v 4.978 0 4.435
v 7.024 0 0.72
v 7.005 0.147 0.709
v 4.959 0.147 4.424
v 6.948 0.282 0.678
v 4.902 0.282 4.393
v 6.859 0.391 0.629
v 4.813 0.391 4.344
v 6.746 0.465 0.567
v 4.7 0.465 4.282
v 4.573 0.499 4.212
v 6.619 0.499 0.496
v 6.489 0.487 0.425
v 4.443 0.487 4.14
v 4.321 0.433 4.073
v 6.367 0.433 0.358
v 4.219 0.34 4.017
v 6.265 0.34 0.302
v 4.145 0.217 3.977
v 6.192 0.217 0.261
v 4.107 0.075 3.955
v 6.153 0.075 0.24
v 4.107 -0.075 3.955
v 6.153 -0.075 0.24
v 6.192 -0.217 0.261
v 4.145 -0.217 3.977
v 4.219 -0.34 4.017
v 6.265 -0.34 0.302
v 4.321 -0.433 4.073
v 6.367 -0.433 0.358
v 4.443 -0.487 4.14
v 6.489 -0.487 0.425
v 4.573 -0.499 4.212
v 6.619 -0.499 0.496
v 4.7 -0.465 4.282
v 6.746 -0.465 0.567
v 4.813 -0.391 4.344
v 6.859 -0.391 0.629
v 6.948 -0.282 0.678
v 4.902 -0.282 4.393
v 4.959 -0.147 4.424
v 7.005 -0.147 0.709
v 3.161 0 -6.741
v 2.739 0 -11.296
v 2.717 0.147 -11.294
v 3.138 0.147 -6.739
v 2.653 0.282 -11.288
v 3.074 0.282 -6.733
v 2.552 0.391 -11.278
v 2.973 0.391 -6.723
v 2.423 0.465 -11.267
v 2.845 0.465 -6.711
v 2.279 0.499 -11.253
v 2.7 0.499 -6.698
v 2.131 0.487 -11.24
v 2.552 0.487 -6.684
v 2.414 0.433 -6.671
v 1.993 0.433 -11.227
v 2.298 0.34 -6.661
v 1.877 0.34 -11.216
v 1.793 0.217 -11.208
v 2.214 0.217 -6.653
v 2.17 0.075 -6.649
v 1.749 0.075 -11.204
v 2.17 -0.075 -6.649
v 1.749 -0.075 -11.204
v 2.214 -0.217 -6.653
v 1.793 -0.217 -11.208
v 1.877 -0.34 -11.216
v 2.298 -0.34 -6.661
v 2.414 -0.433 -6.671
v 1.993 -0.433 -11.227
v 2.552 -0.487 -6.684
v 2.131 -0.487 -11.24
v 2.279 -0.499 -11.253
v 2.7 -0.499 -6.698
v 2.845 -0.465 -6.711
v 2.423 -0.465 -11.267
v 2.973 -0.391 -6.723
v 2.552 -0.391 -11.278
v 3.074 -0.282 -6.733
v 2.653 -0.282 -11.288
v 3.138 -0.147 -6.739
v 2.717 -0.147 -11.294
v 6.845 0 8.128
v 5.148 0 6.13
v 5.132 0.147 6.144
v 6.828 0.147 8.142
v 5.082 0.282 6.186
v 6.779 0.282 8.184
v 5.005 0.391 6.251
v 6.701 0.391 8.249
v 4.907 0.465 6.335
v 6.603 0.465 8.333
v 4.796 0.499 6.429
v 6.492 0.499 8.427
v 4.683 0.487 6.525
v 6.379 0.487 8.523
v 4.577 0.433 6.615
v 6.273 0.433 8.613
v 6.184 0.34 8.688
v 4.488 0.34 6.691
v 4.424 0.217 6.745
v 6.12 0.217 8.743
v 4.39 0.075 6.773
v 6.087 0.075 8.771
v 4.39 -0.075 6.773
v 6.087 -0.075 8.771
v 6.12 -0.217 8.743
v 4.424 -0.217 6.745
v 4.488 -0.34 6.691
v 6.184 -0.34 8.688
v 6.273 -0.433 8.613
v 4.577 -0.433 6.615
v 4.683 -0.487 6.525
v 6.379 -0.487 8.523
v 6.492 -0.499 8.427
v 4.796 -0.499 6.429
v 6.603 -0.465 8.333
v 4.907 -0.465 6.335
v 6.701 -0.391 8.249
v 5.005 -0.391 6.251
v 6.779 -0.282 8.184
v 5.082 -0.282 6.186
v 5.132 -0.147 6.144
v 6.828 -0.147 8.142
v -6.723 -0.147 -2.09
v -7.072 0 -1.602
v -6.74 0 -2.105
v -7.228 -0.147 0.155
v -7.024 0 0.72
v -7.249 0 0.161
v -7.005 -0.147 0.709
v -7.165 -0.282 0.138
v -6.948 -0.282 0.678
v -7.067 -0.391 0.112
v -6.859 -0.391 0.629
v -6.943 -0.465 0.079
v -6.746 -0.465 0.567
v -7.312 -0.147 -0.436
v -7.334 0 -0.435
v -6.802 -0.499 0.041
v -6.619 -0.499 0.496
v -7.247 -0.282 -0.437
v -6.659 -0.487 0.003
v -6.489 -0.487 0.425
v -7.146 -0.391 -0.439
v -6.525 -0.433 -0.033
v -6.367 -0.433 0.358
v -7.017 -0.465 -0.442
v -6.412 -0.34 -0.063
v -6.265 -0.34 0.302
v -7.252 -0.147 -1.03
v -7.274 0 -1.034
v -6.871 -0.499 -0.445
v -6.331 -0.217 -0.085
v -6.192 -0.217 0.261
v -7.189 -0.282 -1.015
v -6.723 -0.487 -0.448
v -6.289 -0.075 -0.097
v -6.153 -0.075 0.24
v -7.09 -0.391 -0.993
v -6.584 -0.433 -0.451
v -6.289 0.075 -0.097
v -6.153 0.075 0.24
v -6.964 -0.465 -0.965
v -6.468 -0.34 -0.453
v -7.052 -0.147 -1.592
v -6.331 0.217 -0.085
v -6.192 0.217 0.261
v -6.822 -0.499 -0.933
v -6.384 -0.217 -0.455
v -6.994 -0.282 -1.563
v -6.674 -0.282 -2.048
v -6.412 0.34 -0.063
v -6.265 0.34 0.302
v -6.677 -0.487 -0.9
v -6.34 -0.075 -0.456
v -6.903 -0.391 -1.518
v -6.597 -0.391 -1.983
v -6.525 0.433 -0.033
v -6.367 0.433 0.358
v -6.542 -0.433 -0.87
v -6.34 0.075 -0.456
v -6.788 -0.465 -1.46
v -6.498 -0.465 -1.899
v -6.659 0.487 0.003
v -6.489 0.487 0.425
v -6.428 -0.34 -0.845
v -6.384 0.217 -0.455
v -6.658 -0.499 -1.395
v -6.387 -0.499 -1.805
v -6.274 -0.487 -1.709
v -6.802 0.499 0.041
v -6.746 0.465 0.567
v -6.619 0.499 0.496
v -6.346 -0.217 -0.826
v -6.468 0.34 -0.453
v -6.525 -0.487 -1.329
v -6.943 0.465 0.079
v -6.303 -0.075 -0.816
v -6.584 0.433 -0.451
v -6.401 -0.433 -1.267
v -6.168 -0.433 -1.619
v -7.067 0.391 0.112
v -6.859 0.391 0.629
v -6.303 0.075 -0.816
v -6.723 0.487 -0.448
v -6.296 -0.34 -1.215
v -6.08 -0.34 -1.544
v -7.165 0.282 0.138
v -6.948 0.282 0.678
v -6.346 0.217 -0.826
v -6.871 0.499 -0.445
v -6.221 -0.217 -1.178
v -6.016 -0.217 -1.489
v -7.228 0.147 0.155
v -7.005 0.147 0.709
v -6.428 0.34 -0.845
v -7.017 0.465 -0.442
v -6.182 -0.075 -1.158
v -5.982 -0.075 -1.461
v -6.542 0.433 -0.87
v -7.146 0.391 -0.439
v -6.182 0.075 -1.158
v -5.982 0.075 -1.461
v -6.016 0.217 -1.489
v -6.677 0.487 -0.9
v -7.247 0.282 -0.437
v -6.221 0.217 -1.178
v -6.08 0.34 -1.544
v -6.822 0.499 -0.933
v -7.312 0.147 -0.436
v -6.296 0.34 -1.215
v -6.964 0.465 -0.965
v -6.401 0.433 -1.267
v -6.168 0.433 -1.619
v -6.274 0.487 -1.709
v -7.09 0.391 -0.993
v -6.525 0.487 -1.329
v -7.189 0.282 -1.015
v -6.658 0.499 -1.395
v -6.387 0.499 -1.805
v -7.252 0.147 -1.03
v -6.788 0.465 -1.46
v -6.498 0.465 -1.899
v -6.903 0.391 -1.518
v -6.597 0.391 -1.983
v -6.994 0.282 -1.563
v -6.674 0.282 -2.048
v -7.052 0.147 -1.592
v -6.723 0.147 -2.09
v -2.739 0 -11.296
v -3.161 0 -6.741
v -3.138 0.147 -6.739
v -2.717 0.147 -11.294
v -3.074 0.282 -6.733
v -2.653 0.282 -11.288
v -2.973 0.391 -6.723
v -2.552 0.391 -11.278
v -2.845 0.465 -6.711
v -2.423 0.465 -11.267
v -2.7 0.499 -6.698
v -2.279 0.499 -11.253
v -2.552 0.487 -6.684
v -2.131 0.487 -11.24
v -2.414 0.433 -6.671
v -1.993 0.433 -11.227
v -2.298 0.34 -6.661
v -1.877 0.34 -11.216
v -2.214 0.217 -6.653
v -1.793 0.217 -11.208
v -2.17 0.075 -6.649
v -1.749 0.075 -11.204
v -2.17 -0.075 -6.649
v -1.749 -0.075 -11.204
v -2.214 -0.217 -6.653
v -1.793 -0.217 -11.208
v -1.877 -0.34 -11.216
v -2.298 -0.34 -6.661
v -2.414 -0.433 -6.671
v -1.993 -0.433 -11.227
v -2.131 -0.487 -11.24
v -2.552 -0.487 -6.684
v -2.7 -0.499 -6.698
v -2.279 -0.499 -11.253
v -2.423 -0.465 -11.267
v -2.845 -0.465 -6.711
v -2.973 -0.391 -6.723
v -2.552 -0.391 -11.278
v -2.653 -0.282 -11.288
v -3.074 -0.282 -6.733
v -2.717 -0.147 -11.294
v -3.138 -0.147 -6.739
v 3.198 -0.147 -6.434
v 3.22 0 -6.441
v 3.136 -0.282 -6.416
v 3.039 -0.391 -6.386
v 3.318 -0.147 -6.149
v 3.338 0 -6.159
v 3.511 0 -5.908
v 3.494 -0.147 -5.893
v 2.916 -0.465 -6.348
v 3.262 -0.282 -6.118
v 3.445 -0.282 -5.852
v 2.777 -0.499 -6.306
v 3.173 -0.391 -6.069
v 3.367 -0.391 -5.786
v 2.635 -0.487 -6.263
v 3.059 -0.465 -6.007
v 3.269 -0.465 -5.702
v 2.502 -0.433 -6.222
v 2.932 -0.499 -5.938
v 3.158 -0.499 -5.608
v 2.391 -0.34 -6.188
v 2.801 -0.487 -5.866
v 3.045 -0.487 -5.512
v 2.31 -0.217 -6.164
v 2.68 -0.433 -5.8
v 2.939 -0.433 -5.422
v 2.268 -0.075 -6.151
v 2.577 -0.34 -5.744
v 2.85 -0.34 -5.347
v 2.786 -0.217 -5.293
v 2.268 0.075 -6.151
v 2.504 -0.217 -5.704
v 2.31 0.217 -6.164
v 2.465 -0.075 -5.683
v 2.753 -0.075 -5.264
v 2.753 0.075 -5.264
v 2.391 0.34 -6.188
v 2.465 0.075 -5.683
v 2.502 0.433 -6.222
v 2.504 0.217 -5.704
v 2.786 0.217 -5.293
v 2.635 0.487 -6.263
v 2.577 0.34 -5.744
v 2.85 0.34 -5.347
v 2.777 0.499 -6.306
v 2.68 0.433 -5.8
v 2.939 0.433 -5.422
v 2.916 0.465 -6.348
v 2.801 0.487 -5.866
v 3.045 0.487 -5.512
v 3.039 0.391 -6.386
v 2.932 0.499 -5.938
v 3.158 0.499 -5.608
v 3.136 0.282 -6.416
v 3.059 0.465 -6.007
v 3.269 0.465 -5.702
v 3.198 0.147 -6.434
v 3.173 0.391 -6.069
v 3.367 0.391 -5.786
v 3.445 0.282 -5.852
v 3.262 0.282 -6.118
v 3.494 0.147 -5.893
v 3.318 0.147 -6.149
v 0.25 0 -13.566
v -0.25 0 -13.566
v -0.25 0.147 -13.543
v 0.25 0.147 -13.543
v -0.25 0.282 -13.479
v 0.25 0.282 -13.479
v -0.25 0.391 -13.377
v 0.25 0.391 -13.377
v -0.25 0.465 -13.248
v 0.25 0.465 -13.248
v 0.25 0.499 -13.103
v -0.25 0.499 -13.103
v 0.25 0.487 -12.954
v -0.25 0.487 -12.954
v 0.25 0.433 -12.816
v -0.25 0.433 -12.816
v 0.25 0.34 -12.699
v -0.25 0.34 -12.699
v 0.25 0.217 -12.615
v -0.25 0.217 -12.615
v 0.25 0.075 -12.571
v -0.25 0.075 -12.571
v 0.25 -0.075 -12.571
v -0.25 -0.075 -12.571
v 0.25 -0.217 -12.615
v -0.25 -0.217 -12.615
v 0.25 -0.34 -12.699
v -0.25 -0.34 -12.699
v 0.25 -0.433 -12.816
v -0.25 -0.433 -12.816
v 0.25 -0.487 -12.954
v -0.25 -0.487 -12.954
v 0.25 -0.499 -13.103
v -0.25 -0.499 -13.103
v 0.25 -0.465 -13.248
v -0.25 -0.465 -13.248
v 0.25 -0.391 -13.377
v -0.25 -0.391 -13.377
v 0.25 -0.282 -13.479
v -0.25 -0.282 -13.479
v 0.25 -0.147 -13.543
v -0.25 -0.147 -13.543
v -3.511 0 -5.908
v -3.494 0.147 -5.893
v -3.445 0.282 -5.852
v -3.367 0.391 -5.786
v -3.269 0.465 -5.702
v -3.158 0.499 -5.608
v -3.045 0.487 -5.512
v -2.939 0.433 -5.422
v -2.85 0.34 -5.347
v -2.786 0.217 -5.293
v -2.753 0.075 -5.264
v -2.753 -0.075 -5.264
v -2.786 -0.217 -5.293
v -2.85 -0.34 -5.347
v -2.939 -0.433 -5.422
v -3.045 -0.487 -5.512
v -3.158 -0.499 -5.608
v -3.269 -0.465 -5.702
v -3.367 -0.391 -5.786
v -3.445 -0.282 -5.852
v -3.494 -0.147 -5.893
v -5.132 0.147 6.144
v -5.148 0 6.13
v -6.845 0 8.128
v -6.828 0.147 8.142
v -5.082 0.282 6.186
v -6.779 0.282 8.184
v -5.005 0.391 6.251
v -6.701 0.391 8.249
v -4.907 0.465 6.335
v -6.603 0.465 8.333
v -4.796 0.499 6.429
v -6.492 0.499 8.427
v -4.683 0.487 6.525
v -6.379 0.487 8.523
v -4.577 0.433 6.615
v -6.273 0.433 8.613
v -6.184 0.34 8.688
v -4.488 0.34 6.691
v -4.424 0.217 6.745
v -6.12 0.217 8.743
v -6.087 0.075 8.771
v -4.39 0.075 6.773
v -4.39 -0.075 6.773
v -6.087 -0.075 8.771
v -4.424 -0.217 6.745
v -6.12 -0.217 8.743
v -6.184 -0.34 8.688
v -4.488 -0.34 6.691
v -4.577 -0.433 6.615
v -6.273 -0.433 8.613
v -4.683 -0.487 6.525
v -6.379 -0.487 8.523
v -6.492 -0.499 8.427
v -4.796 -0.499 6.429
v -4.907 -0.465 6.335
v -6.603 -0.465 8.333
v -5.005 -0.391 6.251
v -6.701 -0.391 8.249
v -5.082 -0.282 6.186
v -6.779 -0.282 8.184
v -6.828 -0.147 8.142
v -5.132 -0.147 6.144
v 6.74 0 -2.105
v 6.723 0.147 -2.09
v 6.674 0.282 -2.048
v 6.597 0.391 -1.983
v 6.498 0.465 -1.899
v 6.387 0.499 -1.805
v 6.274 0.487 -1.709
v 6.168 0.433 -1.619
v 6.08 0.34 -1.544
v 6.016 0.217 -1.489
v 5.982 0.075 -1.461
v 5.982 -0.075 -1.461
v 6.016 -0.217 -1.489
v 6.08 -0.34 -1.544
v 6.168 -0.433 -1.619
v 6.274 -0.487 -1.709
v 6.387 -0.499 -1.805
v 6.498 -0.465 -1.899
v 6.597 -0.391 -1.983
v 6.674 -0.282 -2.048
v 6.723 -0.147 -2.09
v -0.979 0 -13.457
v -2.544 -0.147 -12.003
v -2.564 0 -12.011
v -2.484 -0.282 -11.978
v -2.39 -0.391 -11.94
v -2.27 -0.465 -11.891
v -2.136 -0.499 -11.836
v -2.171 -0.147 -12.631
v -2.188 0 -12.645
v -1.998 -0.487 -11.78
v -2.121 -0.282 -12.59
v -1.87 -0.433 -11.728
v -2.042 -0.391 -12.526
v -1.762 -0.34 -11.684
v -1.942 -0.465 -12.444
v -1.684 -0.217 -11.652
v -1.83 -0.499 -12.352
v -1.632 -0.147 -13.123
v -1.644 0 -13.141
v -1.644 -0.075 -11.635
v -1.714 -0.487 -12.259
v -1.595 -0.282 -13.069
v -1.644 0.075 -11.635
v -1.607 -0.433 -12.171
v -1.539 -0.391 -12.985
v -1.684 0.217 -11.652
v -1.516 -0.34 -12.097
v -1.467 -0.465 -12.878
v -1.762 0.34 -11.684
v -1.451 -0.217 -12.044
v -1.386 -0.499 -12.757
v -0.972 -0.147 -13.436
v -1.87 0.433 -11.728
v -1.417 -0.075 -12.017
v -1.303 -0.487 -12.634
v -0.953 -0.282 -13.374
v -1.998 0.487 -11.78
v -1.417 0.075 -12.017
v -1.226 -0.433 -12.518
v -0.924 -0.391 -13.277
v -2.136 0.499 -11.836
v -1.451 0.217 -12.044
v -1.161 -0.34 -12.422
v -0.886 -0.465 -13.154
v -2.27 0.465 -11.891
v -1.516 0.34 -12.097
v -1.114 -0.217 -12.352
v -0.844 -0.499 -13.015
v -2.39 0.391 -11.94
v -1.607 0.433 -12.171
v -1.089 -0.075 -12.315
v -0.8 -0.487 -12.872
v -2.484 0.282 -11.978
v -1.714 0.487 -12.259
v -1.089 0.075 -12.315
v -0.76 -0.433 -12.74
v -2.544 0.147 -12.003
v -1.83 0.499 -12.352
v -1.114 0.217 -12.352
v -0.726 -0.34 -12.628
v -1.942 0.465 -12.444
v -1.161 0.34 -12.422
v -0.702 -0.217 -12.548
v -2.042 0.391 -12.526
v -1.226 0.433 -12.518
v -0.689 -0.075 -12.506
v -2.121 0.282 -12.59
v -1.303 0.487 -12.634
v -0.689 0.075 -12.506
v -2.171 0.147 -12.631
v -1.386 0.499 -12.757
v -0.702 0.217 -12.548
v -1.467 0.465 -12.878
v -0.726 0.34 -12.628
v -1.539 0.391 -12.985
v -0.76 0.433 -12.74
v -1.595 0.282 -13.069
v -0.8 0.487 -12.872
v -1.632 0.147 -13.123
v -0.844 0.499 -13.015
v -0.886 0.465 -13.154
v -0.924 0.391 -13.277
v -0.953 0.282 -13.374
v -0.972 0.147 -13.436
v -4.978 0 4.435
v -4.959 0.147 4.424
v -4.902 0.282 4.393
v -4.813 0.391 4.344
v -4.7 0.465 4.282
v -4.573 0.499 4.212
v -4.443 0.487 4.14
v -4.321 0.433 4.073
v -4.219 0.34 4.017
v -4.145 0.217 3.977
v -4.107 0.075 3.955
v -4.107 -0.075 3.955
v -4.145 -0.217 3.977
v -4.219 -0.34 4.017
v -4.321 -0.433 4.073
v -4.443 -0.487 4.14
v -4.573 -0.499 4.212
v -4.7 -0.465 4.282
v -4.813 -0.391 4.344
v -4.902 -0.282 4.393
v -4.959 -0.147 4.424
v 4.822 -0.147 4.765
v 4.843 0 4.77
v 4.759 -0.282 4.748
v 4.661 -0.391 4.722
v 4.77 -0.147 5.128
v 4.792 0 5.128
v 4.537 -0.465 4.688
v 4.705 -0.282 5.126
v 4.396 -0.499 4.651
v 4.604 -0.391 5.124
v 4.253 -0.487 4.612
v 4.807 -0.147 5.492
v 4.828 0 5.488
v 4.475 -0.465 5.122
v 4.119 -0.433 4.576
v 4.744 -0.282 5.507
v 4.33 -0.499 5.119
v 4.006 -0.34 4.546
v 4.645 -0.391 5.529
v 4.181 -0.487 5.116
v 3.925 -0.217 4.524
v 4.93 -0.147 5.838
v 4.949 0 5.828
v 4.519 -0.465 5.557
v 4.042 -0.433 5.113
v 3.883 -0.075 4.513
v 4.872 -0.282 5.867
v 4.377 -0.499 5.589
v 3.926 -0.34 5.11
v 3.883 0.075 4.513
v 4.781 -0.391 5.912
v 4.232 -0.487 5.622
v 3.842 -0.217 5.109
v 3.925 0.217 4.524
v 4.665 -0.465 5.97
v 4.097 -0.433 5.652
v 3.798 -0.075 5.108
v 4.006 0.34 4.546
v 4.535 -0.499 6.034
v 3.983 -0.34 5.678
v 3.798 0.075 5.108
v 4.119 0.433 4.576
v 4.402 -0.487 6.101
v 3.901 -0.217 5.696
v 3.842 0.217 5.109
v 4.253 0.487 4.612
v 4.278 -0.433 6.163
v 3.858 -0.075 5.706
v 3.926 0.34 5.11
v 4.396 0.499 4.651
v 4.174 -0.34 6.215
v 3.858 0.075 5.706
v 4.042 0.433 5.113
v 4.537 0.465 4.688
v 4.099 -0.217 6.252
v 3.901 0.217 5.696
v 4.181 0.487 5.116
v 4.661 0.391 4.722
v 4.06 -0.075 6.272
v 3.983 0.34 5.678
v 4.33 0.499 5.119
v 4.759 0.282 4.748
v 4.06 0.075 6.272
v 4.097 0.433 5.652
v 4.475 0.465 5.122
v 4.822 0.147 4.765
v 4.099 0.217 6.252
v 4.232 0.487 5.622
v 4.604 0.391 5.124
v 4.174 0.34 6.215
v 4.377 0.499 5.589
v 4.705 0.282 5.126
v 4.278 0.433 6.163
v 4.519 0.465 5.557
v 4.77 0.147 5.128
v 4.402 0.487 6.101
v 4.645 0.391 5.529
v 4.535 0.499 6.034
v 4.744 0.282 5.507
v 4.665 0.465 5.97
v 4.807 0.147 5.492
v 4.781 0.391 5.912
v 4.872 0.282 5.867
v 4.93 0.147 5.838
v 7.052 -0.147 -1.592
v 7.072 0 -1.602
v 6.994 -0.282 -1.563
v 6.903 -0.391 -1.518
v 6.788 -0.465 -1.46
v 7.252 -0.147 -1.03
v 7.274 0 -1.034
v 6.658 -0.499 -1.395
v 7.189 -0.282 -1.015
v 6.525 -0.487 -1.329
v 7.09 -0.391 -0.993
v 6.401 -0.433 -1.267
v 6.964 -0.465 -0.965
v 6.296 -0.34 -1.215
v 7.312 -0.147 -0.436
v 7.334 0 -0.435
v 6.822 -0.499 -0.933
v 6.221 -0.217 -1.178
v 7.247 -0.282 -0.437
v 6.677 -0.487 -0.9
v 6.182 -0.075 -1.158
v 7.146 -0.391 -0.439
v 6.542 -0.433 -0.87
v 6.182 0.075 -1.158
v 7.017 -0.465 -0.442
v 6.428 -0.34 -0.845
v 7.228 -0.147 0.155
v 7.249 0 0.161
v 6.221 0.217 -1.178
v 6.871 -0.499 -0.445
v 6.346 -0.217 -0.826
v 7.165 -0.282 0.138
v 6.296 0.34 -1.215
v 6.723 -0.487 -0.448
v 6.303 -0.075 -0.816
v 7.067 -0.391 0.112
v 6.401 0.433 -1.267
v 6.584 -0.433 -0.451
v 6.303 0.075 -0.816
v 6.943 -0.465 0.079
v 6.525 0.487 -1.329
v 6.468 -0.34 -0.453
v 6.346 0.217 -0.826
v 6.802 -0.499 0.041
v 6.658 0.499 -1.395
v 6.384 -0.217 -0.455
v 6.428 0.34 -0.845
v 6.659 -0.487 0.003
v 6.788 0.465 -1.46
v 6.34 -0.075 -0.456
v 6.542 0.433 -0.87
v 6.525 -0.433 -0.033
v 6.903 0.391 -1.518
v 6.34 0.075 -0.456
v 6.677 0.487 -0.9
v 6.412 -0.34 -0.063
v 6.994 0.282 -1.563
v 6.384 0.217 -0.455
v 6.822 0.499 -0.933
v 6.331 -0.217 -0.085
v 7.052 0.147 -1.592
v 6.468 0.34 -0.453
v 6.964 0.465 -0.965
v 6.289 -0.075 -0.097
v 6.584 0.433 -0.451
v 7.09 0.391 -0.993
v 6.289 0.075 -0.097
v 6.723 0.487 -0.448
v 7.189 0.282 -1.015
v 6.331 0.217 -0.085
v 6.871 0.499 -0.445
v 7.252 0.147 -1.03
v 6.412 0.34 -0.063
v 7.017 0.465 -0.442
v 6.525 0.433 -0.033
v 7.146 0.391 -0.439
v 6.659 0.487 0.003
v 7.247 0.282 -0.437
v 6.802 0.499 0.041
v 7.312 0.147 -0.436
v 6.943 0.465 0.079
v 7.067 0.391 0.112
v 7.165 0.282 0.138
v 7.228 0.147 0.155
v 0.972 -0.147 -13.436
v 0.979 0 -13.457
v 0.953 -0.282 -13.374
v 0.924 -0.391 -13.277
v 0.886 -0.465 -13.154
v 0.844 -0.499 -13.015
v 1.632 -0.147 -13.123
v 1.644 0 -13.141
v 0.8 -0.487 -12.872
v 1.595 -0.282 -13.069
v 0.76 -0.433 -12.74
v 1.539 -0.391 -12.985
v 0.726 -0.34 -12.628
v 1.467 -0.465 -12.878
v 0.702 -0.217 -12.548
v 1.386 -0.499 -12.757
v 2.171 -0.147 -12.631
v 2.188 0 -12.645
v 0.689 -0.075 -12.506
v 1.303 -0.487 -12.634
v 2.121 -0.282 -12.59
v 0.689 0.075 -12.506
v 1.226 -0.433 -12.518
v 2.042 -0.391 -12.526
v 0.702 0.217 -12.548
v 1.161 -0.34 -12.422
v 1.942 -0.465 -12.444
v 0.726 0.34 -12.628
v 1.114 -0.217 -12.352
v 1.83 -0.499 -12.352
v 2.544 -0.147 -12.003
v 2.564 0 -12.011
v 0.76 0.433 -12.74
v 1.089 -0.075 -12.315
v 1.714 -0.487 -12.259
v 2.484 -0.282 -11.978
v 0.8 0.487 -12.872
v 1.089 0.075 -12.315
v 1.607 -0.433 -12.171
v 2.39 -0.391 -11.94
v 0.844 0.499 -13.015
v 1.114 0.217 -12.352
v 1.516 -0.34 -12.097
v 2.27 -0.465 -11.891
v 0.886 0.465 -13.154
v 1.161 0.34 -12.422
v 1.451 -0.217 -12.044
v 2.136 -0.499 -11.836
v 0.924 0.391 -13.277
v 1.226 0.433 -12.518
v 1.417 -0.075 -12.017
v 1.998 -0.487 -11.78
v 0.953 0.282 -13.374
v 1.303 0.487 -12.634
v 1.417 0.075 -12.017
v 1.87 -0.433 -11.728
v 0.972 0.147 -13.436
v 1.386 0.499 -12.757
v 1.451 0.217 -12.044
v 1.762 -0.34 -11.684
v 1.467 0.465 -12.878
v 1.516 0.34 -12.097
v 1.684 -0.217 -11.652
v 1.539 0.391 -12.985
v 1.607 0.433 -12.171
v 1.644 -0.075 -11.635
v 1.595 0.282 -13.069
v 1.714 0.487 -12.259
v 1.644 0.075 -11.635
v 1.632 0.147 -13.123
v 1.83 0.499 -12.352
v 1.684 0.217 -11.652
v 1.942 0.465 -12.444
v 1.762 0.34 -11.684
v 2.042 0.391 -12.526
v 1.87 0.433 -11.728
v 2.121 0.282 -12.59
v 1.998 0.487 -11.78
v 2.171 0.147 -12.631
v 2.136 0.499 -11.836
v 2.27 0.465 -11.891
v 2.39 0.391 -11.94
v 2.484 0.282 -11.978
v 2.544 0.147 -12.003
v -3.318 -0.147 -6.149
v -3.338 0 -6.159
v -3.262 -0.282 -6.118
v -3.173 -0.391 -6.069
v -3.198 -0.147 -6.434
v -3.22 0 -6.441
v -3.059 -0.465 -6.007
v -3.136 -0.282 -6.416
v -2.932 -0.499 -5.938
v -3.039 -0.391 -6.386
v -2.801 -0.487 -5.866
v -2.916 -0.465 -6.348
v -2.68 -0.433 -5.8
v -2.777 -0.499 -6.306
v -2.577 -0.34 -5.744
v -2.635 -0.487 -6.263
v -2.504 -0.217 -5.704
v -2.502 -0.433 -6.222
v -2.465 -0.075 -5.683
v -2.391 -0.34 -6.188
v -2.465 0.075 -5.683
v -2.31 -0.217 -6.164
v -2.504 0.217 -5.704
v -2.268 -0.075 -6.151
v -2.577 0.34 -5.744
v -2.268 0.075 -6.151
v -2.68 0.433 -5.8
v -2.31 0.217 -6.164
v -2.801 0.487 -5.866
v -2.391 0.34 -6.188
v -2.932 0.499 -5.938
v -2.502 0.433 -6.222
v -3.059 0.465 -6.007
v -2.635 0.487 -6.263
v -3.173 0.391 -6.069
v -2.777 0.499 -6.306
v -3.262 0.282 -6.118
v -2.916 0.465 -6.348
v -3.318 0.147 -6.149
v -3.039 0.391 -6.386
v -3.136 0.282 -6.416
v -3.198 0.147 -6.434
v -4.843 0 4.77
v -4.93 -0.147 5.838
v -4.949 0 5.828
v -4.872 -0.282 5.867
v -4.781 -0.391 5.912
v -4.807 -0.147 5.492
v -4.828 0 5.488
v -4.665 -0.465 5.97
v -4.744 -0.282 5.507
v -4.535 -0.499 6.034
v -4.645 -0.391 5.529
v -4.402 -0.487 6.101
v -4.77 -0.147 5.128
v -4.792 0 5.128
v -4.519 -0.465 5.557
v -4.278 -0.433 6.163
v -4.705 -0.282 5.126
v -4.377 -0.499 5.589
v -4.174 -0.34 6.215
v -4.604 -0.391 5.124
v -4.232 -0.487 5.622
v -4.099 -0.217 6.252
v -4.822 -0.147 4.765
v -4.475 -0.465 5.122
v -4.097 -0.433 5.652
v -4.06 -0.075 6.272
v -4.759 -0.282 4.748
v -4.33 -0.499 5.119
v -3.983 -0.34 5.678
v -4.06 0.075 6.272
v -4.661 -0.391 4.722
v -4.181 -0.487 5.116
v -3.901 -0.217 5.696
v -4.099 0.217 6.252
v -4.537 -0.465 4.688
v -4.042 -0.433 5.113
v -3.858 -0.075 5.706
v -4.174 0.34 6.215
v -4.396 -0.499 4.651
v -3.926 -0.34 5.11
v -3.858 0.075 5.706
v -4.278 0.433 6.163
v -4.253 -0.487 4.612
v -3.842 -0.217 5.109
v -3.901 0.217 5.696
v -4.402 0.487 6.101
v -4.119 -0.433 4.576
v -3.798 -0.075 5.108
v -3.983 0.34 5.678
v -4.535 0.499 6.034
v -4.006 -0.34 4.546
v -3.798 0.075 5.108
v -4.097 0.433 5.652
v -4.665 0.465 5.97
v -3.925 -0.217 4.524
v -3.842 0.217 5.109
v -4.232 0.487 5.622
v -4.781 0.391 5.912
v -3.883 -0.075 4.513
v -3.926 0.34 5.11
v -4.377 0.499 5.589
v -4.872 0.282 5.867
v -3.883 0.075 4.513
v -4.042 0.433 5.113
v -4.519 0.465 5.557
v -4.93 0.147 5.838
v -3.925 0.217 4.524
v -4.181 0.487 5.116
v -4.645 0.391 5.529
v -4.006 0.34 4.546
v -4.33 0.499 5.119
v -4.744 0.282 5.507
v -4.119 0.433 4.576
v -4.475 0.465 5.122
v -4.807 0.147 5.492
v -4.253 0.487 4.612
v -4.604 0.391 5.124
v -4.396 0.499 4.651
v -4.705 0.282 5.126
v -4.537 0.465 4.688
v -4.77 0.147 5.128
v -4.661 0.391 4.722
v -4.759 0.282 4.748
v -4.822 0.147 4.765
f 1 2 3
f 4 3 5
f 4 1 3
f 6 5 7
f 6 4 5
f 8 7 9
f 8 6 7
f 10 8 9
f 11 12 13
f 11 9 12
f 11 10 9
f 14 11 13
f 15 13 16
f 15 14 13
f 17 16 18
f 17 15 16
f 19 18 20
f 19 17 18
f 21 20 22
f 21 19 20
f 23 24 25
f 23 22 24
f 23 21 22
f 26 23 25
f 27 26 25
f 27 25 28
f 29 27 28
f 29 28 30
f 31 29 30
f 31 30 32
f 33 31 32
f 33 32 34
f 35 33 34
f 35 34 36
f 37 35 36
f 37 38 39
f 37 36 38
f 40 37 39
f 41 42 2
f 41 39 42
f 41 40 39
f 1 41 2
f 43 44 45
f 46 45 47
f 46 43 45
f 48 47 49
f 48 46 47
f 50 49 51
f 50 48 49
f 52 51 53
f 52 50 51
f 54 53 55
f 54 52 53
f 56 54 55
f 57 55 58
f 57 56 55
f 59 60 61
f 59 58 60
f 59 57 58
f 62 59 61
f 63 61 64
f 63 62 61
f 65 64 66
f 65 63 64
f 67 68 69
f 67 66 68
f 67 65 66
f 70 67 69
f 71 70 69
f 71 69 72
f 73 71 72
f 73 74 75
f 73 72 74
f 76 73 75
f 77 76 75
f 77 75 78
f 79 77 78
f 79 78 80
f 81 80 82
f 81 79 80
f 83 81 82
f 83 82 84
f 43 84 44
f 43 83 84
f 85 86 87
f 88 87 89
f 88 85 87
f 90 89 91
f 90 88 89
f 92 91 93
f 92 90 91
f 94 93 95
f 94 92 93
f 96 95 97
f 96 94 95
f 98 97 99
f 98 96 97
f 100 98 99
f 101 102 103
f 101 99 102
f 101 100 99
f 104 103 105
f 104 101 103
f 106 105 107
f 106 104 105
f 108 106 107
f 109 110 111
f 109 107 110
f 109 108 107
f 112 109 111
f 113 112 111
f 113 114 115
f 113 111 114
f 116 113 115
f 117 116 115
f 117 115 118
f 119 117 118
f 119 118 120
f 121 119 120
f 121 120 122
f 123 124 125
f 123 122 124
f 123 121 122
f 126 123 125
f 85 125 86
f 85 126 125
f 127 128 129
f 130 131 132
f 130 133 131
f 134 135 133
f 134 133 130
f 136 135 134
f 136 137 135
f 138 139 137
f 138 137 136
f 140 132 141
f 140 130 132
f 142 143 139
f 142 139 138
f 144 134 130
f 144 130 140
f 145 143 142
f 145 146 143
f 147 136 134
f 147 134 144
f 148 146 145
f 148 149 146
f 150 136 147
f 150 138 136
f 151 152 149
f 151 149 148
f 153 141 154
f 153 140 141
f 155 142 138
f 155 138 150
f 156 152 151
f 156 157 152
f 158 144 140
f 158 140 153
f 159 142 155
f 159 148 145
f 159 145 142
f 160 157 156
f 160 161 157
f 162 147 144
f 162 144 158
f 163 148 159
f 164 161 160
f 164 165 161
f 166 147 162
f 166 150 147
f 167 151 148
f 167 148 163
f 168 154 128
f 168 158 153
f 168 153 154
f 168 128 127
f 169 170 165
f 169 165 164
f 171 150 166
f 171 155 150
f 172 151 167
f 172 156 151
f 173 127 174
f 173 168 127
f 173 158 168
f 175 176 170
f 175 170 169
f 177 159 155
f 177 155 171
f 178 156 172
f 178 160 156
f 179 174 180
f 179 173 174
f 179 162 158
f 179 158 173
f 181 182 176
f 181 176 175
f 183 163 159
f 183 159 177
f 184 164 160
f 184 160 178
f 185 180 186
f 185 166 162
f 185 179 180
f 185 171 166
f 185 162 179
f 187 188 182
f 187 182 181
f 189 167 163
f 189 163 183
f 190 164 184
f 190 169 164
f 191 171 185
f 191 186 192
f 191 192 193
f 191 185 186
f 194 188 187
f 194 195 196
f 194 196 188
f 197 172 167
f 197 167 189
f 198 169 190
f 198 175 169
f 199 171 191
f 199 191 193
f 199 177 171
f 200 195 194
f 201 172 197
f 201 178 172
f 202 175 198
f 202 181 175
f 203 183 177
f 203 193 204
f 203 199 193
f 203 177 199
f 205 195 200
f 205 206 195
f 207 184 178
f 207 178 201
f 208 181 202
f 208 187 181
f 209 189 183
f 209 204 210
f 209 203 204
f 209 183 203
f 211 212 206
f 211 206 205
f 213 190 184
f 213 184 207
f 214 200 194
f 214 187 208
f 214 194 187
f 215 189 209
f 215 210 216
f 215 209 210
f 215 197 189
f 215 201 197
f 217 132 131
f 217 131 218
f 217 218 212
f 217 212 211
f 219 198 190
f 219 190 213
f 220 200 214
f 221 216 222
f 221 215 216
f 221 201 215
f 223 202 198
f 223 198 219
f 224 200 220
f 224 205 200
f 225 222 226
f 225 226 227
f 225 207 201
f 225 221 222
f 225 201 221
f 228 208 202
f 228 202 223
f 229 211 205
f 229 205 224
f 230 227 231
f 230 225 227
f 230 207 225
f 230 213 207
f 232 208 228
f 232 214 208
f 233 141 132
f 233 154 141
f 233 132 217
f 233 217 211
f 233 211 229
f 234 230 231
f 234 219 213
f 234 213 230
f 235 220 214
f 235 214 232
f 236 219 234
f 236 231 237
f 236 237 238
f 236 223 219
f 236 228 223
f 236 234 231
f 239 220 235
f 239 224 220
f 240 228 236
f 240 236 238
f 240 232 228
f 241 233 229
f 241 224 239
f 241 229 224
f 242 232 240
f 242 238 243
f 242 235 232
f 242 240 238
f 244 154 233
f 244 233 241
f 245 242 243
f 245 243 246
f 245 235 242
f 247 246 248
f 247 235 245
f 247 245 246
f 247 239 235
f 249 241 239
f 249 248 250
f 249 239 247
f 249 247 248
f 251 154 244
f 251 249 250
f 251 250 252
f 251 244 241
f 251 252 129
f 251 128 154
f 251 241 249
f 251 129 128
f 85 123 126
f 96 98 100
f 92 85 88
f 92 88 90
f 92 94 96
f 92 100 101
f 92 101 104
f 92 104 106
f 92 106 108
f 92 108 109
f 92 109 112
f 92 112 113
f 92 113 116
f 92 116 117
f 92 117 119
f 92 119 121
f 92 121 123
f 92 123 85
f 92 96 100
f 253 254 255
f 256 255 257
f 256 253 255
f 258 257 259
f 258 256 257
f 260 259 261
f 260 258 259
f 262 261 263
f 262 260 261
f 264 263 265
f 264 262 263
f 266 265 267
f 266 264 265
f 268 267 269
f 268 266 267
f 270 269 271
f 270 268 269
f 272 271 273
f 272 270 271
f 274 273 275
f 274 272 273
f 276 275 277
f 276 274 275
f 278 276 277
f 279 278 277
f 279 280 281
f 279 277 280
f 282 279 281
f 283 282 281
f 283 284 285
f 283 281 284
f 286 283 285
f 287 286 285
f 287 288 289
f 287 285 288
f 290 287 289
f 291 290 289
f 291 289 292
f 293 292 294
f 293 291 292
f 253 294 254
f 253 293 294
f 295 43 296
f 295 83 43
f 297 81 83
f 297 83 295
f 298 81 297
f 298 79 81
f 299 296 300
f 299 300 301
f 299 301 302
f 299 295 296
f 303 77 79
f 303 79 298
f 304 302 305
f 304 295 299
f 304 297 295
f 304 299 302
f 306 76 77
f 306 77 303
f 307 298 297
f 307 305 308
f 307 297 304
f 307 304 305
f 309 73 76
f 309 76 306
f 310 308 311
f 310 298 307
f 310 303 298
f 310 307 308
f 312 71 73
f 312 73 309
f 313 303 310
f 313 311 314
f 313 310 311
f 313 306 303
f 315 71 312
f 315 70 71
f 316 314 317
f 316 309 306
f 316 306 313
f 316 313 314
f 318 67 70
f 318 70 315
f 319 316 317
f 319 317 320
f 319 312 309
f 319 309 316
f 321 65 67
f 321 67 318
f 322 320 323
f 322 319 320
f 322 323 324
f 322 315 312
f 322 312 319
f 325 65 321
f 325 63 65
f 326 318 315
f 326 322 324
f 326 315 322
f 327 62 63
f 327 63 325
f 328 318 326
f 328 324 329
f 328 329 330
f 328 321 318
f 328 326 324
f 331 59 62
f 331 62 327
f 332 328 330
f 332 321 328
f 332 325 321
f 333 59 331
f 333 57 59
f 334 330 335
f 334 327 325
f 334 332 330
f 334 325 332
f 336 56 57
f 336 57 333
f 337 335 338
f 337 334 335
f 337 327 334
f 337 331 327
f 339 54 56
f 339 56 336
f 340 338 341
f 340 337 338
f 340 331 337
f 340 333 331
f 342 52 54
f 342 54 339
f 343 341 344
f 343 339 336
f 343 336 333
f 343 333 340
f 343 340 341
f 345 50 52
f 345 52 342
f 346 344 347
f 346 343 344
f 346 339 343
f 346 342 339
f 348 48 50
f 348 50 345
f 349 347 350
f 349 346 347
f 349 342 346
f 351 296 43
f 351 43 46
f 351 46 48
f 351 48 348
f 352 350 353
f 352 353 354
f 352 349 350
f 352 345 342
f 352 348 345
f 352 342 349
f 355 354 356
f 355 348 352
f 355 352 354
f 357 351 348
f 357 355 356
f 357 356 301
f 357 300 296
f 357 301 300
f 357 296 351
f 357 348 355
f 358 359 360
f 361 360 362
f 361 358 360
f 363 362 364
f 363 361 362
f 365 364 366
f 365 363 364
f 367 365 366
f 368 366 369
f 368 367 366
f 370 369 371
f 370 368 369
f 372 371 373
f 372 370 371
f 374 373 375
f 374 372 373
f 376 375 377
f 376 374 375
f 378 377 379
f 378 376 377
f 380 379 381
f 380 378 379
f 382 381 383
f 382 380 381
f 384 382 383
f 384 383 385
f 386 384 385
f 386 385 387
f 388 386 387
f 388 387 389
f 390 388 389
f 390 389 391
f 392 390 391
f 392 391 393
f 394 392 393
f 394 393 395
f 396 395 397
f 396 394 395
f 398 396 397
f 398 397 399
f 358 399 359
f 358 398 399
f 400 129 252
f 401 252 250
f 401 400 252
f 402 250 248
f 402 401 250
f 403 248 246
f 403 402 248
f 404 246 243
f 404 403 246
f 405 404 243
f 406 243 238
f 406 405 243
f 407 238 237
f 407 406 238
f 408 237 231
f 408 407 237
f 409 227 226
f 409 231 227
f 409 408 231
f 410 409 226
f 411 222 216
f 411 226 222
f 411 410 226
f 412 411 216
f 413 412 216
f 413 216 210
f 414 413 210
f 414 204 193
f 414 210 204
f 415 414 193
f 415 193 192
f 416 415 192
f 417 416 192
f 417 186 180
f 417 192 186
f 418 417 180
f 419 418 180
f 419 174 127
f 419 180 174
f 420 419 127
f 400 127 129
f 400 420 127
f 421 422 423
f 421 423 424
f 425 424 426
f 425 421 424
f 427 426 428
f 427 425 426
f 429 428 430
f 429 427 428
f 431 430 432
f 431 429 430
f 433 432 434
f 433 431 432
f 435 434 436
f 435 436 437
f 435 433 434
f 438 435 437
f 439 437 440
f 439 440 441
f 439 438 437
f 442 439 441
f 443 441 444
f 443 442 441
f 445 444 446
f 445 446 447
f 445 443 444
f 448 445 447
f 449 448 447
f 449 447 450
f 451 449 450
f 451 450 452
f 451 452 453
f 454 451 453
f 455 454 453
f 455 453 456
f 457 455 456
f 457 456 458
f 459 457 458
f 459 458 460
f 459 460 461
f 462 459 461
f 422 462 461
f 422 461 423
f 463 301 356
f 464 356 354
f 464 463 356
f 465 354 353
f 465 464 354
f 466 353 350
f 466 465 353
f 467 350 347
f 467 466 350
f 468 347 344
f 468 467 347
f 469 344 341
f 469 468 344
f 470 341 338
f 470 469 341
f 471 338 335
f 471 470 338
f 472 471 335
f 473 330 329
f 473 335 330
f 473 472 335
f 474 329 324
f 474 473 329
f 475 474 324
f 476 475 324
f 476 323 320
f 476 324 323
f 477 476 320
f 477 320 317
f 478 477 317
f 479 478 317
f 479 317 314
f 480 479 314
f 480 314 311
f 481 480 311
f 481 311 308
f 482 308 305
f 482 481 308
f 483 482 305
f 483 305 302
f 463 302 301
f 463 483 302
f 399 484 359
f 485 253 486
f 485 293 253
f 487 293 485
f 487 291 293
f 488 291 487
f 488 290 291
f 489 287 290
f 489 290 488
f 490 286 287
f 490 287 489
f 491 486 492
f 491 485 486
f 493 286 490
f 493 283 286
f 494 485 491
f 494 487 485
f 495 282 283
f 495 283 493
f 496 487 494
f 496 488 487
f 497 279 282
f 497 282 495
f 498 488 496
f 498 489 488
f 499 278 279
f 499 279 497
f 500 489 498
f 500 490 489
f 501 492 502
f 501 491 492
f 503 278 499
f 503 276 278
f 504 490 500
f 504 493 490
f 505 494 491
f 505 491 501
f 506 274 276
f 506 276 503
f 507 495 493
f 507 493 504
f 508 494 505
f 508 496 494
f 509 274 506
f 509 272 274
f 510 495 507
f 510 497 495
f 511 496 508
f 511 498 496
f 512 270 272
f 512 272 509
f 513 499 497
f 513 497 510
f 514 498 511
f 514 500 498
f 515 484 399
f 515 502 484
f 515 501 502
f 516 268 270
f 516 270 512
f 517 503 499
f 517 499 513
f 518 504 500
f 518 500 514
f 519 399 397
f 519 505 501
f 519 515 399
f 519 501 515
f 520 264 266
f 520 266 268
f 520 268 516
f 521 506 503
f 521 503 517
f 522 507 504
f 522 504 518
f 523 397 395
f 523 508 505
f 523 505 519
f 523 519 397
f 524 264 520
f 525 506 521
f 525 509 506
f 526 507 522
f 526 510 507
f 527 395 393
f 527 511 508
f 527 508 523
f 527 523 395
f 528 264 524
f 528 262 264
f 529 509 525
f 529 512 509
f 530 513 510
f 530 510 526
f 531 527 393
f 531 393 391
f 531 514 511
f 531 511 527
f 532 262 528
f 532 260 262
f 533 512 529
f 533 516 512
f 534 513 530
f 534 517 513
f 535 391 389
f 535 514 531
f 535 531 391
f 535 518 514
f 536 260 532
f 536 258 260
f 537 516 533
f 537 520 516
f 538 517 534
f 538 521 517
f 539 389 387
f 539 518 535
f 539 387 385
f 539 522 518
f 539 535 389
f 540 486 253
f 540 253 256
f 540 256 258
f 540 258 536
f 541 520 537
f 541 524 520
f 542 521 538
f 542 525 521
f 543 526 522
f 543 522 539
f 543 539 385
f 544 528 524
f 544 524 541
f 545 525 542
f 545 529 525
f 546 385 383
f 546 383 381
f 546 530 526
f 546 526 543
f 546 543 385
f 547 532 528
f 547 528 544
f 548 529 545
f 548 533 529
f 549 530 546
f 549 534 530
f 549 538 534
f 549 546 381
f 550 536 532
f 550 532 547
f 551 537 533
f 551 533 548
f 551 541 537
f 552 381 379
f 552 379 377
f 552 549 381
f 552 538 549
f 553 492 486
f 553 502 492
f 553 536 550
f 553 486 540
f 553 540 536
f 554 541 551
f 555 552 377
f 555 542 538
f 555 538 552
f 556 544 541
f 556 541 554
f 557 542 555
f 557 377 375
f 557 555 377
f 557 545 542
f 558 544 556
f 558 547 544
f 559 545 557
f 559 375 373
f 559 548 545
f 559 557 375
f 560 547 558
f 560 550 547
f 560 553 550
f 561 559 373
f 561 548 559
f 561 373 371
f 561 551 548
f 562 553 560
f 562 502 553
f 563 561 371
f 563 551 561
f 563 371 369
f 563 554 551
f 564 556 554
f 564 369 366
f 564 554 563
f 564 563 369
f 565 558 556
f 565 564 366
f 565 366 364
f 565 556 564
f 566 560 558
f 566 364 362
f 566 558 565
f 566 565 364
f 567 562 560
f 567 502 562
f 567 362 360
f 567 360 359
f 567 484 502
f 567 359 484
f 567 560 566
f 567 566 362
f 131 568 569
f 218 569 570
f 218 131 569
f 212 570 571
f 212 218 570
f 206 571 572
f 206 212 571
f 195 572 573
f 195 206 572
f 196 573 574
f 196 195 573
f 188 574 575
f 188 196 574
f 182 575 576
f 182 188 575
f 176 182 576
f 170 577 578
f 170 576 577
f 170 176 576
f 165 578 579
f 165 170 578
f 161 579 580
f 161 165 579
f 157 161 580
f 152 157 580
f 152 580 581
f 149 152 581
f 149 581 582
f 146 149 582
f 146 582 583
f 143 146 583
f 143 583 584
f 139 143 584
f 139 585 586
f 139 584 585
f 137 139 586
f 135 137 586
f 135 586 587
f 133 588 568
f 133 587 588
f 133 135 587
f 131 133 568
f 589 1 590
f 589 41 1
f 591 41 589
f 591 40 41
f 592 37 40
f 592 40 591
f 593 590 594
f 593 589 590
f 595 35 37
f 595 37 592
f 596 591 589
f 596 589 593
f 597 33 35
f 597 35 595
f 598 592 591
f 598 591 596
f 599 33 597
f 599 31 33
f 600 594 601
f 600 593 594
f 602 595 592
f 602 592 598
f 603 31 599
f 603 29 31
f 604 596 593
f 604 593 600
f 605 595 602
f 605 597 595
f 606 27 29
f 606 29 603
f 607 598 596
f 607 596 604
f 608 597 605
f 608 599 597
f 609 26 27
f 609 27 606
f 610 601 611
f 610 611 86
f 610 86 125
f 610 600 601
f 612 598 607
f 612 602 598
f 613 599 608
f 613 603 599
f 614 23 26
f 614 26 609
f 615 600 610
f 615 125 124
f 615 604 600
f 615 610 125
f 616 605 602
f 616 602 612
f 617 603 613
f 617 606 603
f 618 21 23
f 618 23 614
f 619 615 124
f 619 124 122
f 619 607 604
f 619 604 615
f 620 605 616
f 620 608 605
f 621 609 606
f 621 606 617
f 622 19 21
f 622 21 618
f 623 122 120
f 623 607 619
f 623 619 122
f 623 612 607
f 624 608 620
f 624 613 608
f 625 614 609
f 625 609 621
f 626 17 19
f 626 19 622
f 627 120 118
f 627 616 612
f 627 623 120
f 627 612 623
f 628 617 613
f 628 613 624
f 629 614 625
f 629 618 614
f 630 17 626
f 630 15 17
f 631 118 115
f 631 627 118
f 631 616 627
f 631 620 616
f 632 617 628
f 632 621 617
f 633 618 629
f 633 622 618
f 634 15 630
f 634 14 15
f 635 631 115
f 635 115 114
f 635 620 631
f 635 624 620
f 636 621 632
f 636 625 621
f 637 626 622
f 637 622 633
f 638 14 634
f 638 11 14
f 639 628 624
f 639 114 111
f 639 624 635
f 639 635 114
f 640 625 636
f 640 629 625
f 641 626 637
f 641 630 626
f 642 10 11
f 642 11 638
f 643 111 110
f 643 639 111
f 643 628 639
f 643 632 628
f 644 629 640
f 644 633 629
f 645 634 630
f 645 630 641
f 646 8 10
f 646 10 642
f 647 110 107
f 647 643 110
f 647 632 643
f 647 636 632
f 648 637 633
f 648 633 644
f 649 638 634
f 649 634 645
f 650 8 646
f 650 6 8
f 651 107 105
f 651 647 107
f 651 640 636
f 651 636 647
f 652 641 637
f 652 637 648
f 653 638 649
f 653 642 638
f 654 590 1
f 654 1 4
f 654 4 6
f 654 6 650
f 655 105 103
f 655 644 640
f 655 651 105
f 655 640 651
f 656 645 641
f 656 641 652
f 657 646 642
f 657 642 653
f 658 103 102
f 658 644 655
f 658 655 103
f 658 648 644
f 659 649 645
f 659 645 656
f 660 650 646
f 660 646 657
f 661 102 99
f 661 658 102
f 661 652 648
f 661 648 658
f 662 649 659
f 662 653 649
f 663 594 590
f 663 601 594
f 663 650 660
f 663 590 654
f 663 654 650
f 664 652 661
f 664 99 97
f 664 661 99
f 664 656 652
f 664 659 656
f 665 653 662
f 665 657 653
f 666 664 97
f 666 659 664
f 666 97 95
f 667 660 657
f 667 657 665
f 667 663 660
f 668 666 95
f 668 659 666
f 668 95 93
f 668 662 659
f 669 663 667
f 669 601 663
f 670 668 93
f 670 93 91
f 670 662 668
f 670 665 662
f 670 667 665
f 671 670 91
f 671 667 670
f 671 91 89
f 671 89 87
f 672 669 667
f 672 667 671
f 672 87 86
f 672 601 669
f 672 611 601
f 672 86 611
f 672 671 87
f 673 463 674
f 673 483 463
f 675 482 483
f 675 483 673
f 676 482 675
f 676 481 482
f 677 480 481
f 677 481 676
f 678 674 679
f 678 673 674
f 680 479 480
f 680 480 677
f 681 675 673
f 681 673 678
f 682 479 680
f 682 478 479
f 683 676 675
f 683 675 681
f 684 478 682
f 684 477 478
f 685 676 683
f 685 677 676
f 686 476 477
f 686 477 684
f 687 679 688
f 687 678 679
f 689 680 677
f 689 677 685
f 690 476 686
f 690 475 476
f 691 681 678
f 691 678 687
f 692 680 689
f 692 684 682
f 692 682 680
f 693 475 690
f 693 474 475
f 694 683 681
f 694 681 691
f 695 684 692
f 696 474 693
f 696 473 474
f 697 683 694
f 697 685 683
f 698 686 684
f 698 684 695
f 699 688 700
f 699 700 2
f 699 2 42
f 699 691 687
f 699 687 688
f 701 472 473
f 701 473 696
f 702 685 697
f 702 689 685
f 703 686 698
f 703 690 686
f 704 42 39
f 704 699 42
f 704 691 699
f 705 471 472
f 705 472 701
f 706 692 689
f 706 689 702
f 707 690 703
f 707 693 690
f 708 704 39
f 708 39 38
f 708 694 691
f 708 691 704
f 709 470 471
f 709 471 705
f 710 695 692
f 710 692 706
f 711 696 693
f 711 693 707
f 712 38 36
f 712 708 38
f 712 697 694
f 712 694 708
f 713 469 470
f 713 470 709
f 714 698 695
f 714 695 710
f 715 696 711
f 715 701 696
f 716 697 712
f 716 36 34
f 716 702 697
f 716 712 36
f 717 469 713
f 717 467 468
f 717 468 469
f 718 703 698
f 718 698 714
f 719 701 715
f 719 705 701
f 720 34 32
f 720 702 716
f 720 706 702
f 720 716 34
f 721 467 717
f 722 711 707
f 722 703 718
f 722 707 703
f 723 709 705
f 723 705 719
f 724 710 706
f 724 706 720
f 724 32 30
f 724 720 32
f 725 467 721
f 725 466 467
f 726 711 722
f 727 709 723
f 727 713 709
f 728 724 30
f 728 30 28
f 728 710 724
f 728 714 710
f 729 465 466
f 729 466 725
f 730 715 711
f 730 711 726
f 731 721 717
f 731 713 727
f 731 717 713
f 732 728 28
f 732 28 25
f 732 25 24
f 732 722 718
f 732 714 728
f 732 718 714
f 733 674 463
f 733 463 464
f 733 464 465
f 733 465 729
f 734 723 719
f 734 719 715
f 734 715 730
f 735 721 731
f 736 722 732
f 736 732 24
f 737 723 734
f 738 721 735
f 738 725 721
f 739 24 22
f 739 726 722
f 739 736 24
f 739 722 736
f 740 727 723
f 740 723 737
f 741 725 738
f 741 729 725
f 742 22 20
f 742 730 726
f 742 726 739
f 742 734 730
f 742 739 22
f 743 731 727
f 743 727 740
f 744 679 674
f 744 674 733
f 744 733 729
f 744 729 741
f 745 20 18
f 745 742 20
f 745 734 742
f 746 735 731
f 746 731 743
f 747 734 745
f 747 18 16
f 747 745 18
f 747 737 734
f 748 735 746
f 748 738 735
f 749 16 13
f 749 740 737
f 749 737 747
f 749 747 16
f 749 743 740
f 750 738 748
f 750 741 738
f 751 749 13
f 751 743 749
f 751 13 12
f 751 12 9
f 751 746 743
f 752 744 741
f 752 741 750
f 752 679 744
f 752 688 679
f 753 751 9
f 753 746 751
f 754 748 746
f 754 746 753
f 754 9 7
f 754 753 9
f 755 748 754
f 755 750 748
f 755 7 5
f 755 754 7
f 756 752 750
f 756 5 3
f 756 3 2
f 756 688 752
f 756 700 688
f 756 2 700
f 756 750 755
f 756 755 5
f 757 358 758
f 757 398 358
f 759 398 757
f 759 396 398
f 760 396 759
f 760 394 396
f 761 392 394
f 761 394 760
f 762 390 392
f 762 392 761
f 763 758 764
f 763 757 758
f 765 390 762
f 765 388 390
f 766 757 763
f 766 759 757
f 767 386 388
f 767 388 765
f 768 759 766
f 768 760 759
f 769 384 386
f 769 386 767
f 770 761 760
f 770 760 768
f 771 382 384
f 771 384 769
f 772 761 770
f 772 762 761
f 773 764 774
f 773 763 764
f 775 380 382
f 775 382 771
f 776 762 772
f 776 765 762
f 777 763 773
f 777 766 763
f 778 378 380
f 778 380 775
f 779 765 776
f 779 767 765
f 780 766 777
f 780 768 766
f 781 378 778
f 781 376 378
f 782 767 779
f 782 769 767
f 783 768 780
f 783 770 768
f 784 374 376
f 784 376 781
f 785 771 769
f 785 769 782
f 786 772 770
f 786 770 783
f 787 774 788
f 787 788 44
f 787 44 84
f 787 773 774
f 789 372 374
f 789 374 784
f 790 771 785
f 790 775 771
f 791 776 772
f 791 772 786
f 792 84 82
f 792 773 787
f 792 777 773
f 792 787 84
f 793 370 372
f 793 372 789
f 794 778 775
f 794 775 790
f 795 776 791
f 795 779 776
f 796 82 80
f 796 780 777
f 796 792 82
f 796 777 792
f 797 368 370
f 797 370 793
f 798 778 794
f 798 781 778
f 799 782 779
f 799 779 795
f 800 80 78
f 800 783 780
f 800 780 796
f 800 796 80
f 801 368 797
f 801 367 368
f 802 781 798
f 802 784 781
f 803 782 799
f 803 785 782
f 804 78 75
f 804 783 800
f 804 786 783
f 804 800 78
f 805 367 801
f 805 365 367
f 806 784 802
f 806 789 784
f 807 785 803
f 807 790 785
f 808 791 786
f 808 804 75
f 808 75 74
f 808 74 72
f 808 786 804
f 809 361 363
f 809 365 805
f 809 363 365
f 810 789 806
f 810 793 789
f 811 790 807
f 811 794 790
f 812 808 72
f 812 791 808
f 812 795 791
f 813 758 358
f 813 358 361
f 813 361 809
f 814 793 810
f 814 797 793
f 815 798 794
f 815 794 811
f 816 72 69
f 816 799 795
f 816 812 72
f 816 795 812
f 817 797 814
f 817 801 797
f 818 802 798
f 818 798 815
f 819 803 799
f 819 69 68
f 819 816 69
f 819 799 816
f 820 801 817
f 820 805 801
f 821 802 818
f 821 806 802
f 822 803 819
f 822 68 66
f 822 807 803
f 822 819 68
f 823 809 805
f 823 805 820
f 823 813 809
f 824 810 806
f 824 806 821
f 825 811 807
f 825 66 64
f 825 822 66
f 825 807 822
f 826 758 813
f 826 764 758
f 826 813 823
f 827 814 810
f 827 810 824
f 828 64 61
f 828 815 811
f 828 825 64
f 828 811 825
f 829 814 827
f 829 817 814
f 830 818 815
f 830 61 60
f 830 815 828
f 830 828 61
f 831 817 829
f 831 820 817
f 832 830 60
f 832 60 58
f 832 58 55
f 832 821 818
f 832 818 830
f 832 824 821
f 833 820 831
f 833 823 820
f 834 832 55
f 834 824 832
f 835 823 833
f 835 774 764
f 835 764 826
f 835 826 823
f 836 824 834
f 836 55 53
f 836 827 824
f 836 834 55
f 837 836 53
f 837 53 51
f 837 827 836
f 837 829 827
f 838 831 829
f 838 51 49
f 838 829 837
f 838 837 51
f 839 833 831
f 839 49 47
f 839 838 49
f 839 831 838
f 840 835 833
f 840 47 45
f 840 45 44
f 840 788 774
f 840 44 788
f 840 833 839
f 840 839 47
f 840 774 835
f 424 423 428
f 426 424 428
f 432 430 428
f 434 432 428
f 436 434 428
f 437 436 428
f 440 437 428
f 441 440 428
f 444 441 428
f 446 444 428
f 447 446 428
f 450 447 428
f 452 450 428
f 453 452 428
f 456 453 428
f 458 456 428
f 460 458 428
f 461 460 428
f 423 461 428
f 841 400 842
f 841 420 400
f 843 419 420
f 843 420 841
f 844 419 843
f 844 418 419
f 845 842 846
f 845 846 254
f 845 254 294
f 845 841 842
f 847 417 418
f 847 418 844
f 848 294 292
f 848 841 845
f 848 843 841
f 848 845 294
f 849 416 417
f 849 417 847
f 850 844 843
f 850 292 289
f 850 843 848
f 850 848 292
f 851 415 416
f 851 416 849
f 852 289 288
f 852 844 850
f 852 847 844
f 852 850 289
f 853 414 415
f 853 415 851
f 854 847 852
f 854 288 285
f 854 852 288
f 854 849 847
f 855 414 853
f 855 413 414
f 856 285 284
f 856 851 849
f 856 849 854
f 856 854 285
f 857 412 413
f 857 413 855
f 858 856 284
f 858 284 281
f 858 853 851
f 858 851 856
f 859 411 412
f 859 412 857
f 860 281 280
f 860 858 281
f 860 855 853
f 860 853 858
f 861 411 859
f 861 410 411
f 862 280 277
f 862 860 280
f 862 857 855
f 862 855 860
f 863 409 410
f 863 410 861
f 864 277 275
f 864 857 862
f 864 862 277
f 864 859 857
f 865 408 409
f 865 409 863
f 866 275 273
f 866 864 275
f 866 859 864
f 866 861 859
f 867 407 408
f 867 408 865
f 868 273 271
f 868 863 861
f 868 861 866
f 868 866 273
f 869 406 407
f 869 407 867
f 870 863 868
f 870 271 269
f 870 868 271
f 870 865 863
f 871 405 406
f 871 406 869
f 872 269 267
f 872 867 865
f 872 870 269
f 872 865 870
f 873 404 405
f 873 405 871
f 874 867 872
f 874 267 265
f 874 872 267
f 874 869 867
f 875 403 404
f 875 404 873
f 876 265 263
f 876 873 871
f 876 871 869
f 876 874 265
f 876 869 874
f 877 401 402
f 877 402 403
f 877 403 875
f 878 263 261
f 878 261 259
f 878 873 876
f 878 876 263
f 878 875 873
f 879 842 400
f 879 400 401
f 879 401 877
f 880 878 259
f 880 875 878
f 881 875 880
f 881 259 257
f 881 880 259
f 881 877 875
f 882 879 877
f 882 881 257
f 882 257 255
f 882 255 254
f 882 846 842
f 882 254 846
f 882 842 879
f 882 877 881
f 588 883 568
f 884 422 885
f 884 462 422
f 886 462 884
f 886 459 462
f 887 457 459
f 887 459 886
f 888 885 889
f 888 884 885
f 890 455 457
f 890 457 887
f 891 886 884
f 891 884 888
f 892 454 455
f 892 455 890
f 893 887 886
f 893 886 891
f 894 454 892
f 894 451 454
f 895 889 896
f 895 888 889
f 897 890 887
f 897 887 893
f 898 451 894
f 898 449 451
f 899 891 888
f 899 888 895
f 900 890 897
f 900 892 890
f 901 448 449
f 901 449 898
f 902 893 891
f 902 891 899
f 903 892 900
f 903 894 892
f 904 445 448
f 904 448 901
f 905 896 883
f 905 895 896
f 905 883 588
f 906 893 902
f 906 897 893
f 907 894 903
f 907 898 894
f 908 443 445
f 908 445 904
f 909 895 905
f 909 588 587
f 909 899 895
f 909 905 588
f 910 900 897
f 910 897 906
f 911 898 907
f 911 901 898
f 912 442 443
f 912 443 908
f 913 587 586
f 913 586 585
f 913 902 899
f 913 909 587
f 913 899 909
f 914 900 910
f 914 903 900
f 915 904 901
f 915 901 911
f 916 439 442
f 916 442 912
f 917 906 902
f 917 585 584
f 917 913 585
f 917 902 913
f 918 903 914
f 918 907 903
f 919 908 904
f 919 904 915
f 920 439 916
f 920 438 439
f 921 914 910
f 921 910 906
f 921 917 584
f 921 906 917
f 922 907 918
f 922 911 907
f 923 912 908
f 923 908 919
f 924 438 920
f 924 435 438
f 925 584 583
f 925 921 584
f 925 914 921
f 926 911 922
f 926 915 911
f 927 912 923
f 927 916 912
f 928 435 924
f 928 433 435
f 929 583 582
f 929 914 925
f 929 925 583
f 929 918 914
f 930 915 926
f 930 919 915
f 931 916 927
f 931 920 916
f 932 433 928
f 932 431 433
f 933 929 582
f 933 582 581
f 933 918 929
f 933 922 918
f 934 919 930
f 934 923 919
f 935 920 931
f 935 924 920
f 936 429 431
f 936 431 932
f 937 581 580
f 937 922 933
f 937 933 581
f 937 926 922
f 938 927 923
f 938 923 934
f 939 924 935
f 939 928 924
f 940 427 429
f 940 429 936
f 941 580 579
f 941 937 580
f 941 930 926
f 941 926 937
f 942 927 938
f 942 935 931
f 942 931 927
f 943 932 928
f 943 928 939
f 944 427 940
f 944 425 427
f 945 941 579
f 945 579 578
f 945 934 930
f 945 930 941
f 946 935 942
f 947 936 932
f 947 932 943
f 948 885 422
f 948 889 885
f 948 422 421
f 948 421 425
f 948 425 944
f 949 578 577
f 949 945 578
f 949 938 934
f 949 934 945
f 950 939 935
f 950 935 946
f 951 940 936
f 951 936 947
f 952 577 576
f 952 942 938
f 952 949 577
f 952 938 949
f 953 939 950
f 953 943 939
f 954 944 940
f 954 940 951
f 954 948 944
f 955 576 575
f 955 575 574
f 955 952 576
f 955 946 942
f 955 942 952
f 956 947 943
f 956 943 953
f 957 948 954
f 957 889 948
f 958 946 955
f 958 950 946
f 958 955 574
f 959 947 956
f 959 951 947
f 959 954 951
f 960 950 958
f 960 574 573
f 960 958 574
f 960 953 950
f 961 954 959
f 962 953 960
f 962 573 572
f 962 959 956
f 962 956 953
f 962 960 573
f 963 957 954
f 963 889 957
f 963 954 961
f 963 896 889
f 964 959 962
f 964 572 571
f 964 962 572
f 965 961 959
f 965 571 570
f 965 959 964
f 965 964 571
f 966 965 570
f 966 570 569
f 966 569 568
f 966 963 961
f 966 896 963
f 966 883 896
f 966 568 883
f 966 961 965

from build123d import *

# Parameters (mm, degrees)
SWEEP2_PROFILE_R = 0.5


with BuildPart() as part:
    # Sweep2: sweep along a path in Sketch1
    with BuildLine(Plane(origin=(0, 0, 0), x_dir=(1, 0, 0), z_dir=(0, 1, 0))) as sweep2_path:
        Line((-6.463671569, -8.451131015), (-4.767321422, -6.453268913))
        ThreePointArc((-4.767321422, -6.453268913), (-4.301937475, -5.359006878), (-4.539997559, -4.193966529))
        Line((-4.539997559, -4.193966529), (-6.586268207, -0.47839801))
        ThreePointArc((-6.586268207, -0.47839801), (-6.824328291, 0.686642339), (-6.358944344, 1.780904374))
        Line((-6.358944344, 1.780904374), (-3.129650798, 5.584177656))
        ThreePointArc((-3.129650798, 5.584177656), (-2.810607738, 6.103358408), (-2.662715036, 6.694513951))
        Line((-2.662715036, 6.694513951), (-2.241504291, 11.249767737))
        ThreePointArc((-2.241504291, 11.249767737), (-1.597535355, 12.543505756), (-0.25, 13.065619269))
        Line((-0.25, 13.065619269), (0.25, 13.065619269))
        ThreePointArc((0.25, 13.065619269), (1.597535355, 12.543505756), (2.241504291, 11.249767737))
        Line((2.241504291, 11.249767737), (2.662715036, 6.694513951))
        ThreePointArc((2.662715036, 6.694513951), (2.810607738, 6.103358408), (3.129650798, 5.584177656))
        Line((3.129650798, 5.584177656), (6.358944344, 1.780904374))
        ThreePointArc((6.358944344, 1.780904374), (6.824328291, 0.686642339), (6.586268207, -0.47839801))
        Line((6.586268207, -0.47839801), (4.539997559, -4.193966529))
        ThreePointArc((4.539997559, -4.193966529), (4.301937475, -5.359006878), (4.767321422, -6.453268913))
        Line((4.767321422, -6.453268913), (6.463671569, -8.451131015))
    # Sweep2 profile (on start of the path) → Sweep2 (sweep)
    with BuildSketch(Plane(origin=(-6.463671569, 0, 8.451131015), x_dir=(-0.762284265, 0, -0.647242381), z_dir=(0.647242381, 0, -0.762284265))):
        Circle(SWEEP2_PROFILE_R)
    sweep(path=sweep2_path.line)


solid = part.part
